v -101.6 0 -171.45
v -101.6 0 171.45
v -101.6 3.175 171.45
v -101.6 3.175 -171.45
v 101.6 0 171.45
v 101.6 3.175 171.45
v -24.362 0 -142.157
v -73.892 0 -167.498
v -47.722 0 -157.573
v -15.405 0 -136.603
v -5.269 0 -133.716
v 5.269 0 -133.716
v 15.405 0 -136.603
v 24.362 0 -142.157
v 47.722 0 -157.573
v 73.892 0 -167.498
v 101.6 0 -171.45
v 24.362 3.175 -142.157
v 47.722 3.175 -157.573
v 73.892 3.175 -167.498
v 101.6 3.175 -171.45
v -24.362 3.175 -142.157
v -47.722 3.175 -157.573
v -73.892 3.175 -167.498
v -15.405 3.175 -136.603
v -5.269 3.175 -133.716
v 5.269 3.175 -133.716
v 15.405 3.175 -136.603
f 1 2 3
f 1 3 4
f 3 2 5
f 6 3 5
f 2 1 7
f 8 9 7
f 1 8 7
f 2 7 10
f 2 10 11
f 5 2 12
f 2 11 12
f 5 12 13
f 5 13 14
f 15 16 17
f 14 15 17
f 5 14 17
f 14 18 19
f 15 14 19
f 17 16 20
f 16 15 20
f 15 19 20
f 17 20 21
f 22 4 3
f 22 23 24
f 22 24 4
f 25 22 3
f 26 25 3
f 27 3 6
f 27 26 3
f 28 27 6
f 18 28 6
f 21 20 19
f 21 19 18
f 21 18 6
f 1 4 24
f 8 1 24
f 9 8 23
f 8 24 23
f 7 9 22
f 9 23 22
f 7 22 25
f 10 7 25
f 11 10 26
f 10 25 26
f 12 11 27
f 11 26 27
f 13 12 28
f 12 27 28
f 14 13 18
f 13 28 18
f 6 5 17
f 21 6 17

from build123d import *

# Parameters (mm, degrees)
SKETCH1_W           = 203.2
SKETCH1_H           = 342.9
BOSS_EXTRUDE1_DEPTH = 3.175
CUT_EXTRUDE1_DEPTH  = 200.31819567
FILLET1_R           = 127


with BuildPart() as part:
    # Sketch1 → Boss-Extrude1 (new body)
    with BuildSketch(Plane(origin=(0, 0, 0), x_dir=(1, 0, 0), z_dir=(0, 1, 0))):
        Rectangle(SKETCH1_W, SKETCH1_H)
    extrude(amount=BOSS_EXTRUDE1_DEPTH)

    # Sketch2 → Cut-Extrude1 (cut, through all)
    with BuildSketch(Plane(origin=(0, 3.175, 0), x_dir=(1, 0, 0), z_dir=(0, 1, 0))):
        with BuildLine():
            ThreePointArc((-38.1, 171.45), (0, 133.35), (38.1, 171.45))
            Line((38.1, 171.45), (-38.1, 171.45))
        make_face()
    extrude(amount=-CUT_EXTRUDE1_DEPTH, mode=Mode.SUBTRACT)

    # Fillet1
    # the kernel refuses this fillet: 127 mm, written as the material it takes off along each edge
    with BuildSketch(Plane(origin=(38.1, 161.925, -171.45), x_dir=(-0.42460388780422365, 0, 0.905379223564103), z_dir=(0, -1, 0))) as fillet1_piece_1:
        with BuildLine():
            CenterArc((86.279510002, -114.983161393), FILLET1_R, 115.12559338, 37.958028581)
            Line((-26.962346876, -57.491580696), (-29.227184013, -56.341749082))
            ThreePointArc((-29.227184013, -56.341749082), (-15.780836666, -27.667296473), (-2.299663228, 1.078493875))
            Line((-2.299663228, 1.078493875), (1.078493875, 2.299663228))
            ThreePointArc((1.078493875, 2.299663228), (16.177408125, -1.065051582), (31.276322376, 2.299663228))
            Line((31.276322376, 2.299663228), (32.354816251, 0))
        make_face()
    extrude(amount=320.675, mode=Mode.SUBTRACT)
    with BuildSketch(Plane(origin=(-38.1, 161.925, -171.45), x_dir=(-1, 0, 0), z_dir=(0, -1, 0))) as fillet1_piece_2:
        with BuildLine():
            CenterArc((67.46875, -126.937973134), FILLET1_R, 91.790784659, 37.958028581)
            Line((-13.737980769, -29.293378416), (-15.362115385, -27.340486521))
            ThreePointArc((-15.362115385, -27.340486521), (-5.90471481, -15.09891425), (-2.54, 0))
            Line((-2.54, 0), (0, 2.54))
            ThreePointArc((0, 2.54), (31.75, 2.54), (63.420625, 2.538759463))
            Line((63.420625, 2.538759463), (63.5, 0))
        make_face()
    extrude(amount=320.675, mode=Mode.SUBTRACT)


solid = part.part
